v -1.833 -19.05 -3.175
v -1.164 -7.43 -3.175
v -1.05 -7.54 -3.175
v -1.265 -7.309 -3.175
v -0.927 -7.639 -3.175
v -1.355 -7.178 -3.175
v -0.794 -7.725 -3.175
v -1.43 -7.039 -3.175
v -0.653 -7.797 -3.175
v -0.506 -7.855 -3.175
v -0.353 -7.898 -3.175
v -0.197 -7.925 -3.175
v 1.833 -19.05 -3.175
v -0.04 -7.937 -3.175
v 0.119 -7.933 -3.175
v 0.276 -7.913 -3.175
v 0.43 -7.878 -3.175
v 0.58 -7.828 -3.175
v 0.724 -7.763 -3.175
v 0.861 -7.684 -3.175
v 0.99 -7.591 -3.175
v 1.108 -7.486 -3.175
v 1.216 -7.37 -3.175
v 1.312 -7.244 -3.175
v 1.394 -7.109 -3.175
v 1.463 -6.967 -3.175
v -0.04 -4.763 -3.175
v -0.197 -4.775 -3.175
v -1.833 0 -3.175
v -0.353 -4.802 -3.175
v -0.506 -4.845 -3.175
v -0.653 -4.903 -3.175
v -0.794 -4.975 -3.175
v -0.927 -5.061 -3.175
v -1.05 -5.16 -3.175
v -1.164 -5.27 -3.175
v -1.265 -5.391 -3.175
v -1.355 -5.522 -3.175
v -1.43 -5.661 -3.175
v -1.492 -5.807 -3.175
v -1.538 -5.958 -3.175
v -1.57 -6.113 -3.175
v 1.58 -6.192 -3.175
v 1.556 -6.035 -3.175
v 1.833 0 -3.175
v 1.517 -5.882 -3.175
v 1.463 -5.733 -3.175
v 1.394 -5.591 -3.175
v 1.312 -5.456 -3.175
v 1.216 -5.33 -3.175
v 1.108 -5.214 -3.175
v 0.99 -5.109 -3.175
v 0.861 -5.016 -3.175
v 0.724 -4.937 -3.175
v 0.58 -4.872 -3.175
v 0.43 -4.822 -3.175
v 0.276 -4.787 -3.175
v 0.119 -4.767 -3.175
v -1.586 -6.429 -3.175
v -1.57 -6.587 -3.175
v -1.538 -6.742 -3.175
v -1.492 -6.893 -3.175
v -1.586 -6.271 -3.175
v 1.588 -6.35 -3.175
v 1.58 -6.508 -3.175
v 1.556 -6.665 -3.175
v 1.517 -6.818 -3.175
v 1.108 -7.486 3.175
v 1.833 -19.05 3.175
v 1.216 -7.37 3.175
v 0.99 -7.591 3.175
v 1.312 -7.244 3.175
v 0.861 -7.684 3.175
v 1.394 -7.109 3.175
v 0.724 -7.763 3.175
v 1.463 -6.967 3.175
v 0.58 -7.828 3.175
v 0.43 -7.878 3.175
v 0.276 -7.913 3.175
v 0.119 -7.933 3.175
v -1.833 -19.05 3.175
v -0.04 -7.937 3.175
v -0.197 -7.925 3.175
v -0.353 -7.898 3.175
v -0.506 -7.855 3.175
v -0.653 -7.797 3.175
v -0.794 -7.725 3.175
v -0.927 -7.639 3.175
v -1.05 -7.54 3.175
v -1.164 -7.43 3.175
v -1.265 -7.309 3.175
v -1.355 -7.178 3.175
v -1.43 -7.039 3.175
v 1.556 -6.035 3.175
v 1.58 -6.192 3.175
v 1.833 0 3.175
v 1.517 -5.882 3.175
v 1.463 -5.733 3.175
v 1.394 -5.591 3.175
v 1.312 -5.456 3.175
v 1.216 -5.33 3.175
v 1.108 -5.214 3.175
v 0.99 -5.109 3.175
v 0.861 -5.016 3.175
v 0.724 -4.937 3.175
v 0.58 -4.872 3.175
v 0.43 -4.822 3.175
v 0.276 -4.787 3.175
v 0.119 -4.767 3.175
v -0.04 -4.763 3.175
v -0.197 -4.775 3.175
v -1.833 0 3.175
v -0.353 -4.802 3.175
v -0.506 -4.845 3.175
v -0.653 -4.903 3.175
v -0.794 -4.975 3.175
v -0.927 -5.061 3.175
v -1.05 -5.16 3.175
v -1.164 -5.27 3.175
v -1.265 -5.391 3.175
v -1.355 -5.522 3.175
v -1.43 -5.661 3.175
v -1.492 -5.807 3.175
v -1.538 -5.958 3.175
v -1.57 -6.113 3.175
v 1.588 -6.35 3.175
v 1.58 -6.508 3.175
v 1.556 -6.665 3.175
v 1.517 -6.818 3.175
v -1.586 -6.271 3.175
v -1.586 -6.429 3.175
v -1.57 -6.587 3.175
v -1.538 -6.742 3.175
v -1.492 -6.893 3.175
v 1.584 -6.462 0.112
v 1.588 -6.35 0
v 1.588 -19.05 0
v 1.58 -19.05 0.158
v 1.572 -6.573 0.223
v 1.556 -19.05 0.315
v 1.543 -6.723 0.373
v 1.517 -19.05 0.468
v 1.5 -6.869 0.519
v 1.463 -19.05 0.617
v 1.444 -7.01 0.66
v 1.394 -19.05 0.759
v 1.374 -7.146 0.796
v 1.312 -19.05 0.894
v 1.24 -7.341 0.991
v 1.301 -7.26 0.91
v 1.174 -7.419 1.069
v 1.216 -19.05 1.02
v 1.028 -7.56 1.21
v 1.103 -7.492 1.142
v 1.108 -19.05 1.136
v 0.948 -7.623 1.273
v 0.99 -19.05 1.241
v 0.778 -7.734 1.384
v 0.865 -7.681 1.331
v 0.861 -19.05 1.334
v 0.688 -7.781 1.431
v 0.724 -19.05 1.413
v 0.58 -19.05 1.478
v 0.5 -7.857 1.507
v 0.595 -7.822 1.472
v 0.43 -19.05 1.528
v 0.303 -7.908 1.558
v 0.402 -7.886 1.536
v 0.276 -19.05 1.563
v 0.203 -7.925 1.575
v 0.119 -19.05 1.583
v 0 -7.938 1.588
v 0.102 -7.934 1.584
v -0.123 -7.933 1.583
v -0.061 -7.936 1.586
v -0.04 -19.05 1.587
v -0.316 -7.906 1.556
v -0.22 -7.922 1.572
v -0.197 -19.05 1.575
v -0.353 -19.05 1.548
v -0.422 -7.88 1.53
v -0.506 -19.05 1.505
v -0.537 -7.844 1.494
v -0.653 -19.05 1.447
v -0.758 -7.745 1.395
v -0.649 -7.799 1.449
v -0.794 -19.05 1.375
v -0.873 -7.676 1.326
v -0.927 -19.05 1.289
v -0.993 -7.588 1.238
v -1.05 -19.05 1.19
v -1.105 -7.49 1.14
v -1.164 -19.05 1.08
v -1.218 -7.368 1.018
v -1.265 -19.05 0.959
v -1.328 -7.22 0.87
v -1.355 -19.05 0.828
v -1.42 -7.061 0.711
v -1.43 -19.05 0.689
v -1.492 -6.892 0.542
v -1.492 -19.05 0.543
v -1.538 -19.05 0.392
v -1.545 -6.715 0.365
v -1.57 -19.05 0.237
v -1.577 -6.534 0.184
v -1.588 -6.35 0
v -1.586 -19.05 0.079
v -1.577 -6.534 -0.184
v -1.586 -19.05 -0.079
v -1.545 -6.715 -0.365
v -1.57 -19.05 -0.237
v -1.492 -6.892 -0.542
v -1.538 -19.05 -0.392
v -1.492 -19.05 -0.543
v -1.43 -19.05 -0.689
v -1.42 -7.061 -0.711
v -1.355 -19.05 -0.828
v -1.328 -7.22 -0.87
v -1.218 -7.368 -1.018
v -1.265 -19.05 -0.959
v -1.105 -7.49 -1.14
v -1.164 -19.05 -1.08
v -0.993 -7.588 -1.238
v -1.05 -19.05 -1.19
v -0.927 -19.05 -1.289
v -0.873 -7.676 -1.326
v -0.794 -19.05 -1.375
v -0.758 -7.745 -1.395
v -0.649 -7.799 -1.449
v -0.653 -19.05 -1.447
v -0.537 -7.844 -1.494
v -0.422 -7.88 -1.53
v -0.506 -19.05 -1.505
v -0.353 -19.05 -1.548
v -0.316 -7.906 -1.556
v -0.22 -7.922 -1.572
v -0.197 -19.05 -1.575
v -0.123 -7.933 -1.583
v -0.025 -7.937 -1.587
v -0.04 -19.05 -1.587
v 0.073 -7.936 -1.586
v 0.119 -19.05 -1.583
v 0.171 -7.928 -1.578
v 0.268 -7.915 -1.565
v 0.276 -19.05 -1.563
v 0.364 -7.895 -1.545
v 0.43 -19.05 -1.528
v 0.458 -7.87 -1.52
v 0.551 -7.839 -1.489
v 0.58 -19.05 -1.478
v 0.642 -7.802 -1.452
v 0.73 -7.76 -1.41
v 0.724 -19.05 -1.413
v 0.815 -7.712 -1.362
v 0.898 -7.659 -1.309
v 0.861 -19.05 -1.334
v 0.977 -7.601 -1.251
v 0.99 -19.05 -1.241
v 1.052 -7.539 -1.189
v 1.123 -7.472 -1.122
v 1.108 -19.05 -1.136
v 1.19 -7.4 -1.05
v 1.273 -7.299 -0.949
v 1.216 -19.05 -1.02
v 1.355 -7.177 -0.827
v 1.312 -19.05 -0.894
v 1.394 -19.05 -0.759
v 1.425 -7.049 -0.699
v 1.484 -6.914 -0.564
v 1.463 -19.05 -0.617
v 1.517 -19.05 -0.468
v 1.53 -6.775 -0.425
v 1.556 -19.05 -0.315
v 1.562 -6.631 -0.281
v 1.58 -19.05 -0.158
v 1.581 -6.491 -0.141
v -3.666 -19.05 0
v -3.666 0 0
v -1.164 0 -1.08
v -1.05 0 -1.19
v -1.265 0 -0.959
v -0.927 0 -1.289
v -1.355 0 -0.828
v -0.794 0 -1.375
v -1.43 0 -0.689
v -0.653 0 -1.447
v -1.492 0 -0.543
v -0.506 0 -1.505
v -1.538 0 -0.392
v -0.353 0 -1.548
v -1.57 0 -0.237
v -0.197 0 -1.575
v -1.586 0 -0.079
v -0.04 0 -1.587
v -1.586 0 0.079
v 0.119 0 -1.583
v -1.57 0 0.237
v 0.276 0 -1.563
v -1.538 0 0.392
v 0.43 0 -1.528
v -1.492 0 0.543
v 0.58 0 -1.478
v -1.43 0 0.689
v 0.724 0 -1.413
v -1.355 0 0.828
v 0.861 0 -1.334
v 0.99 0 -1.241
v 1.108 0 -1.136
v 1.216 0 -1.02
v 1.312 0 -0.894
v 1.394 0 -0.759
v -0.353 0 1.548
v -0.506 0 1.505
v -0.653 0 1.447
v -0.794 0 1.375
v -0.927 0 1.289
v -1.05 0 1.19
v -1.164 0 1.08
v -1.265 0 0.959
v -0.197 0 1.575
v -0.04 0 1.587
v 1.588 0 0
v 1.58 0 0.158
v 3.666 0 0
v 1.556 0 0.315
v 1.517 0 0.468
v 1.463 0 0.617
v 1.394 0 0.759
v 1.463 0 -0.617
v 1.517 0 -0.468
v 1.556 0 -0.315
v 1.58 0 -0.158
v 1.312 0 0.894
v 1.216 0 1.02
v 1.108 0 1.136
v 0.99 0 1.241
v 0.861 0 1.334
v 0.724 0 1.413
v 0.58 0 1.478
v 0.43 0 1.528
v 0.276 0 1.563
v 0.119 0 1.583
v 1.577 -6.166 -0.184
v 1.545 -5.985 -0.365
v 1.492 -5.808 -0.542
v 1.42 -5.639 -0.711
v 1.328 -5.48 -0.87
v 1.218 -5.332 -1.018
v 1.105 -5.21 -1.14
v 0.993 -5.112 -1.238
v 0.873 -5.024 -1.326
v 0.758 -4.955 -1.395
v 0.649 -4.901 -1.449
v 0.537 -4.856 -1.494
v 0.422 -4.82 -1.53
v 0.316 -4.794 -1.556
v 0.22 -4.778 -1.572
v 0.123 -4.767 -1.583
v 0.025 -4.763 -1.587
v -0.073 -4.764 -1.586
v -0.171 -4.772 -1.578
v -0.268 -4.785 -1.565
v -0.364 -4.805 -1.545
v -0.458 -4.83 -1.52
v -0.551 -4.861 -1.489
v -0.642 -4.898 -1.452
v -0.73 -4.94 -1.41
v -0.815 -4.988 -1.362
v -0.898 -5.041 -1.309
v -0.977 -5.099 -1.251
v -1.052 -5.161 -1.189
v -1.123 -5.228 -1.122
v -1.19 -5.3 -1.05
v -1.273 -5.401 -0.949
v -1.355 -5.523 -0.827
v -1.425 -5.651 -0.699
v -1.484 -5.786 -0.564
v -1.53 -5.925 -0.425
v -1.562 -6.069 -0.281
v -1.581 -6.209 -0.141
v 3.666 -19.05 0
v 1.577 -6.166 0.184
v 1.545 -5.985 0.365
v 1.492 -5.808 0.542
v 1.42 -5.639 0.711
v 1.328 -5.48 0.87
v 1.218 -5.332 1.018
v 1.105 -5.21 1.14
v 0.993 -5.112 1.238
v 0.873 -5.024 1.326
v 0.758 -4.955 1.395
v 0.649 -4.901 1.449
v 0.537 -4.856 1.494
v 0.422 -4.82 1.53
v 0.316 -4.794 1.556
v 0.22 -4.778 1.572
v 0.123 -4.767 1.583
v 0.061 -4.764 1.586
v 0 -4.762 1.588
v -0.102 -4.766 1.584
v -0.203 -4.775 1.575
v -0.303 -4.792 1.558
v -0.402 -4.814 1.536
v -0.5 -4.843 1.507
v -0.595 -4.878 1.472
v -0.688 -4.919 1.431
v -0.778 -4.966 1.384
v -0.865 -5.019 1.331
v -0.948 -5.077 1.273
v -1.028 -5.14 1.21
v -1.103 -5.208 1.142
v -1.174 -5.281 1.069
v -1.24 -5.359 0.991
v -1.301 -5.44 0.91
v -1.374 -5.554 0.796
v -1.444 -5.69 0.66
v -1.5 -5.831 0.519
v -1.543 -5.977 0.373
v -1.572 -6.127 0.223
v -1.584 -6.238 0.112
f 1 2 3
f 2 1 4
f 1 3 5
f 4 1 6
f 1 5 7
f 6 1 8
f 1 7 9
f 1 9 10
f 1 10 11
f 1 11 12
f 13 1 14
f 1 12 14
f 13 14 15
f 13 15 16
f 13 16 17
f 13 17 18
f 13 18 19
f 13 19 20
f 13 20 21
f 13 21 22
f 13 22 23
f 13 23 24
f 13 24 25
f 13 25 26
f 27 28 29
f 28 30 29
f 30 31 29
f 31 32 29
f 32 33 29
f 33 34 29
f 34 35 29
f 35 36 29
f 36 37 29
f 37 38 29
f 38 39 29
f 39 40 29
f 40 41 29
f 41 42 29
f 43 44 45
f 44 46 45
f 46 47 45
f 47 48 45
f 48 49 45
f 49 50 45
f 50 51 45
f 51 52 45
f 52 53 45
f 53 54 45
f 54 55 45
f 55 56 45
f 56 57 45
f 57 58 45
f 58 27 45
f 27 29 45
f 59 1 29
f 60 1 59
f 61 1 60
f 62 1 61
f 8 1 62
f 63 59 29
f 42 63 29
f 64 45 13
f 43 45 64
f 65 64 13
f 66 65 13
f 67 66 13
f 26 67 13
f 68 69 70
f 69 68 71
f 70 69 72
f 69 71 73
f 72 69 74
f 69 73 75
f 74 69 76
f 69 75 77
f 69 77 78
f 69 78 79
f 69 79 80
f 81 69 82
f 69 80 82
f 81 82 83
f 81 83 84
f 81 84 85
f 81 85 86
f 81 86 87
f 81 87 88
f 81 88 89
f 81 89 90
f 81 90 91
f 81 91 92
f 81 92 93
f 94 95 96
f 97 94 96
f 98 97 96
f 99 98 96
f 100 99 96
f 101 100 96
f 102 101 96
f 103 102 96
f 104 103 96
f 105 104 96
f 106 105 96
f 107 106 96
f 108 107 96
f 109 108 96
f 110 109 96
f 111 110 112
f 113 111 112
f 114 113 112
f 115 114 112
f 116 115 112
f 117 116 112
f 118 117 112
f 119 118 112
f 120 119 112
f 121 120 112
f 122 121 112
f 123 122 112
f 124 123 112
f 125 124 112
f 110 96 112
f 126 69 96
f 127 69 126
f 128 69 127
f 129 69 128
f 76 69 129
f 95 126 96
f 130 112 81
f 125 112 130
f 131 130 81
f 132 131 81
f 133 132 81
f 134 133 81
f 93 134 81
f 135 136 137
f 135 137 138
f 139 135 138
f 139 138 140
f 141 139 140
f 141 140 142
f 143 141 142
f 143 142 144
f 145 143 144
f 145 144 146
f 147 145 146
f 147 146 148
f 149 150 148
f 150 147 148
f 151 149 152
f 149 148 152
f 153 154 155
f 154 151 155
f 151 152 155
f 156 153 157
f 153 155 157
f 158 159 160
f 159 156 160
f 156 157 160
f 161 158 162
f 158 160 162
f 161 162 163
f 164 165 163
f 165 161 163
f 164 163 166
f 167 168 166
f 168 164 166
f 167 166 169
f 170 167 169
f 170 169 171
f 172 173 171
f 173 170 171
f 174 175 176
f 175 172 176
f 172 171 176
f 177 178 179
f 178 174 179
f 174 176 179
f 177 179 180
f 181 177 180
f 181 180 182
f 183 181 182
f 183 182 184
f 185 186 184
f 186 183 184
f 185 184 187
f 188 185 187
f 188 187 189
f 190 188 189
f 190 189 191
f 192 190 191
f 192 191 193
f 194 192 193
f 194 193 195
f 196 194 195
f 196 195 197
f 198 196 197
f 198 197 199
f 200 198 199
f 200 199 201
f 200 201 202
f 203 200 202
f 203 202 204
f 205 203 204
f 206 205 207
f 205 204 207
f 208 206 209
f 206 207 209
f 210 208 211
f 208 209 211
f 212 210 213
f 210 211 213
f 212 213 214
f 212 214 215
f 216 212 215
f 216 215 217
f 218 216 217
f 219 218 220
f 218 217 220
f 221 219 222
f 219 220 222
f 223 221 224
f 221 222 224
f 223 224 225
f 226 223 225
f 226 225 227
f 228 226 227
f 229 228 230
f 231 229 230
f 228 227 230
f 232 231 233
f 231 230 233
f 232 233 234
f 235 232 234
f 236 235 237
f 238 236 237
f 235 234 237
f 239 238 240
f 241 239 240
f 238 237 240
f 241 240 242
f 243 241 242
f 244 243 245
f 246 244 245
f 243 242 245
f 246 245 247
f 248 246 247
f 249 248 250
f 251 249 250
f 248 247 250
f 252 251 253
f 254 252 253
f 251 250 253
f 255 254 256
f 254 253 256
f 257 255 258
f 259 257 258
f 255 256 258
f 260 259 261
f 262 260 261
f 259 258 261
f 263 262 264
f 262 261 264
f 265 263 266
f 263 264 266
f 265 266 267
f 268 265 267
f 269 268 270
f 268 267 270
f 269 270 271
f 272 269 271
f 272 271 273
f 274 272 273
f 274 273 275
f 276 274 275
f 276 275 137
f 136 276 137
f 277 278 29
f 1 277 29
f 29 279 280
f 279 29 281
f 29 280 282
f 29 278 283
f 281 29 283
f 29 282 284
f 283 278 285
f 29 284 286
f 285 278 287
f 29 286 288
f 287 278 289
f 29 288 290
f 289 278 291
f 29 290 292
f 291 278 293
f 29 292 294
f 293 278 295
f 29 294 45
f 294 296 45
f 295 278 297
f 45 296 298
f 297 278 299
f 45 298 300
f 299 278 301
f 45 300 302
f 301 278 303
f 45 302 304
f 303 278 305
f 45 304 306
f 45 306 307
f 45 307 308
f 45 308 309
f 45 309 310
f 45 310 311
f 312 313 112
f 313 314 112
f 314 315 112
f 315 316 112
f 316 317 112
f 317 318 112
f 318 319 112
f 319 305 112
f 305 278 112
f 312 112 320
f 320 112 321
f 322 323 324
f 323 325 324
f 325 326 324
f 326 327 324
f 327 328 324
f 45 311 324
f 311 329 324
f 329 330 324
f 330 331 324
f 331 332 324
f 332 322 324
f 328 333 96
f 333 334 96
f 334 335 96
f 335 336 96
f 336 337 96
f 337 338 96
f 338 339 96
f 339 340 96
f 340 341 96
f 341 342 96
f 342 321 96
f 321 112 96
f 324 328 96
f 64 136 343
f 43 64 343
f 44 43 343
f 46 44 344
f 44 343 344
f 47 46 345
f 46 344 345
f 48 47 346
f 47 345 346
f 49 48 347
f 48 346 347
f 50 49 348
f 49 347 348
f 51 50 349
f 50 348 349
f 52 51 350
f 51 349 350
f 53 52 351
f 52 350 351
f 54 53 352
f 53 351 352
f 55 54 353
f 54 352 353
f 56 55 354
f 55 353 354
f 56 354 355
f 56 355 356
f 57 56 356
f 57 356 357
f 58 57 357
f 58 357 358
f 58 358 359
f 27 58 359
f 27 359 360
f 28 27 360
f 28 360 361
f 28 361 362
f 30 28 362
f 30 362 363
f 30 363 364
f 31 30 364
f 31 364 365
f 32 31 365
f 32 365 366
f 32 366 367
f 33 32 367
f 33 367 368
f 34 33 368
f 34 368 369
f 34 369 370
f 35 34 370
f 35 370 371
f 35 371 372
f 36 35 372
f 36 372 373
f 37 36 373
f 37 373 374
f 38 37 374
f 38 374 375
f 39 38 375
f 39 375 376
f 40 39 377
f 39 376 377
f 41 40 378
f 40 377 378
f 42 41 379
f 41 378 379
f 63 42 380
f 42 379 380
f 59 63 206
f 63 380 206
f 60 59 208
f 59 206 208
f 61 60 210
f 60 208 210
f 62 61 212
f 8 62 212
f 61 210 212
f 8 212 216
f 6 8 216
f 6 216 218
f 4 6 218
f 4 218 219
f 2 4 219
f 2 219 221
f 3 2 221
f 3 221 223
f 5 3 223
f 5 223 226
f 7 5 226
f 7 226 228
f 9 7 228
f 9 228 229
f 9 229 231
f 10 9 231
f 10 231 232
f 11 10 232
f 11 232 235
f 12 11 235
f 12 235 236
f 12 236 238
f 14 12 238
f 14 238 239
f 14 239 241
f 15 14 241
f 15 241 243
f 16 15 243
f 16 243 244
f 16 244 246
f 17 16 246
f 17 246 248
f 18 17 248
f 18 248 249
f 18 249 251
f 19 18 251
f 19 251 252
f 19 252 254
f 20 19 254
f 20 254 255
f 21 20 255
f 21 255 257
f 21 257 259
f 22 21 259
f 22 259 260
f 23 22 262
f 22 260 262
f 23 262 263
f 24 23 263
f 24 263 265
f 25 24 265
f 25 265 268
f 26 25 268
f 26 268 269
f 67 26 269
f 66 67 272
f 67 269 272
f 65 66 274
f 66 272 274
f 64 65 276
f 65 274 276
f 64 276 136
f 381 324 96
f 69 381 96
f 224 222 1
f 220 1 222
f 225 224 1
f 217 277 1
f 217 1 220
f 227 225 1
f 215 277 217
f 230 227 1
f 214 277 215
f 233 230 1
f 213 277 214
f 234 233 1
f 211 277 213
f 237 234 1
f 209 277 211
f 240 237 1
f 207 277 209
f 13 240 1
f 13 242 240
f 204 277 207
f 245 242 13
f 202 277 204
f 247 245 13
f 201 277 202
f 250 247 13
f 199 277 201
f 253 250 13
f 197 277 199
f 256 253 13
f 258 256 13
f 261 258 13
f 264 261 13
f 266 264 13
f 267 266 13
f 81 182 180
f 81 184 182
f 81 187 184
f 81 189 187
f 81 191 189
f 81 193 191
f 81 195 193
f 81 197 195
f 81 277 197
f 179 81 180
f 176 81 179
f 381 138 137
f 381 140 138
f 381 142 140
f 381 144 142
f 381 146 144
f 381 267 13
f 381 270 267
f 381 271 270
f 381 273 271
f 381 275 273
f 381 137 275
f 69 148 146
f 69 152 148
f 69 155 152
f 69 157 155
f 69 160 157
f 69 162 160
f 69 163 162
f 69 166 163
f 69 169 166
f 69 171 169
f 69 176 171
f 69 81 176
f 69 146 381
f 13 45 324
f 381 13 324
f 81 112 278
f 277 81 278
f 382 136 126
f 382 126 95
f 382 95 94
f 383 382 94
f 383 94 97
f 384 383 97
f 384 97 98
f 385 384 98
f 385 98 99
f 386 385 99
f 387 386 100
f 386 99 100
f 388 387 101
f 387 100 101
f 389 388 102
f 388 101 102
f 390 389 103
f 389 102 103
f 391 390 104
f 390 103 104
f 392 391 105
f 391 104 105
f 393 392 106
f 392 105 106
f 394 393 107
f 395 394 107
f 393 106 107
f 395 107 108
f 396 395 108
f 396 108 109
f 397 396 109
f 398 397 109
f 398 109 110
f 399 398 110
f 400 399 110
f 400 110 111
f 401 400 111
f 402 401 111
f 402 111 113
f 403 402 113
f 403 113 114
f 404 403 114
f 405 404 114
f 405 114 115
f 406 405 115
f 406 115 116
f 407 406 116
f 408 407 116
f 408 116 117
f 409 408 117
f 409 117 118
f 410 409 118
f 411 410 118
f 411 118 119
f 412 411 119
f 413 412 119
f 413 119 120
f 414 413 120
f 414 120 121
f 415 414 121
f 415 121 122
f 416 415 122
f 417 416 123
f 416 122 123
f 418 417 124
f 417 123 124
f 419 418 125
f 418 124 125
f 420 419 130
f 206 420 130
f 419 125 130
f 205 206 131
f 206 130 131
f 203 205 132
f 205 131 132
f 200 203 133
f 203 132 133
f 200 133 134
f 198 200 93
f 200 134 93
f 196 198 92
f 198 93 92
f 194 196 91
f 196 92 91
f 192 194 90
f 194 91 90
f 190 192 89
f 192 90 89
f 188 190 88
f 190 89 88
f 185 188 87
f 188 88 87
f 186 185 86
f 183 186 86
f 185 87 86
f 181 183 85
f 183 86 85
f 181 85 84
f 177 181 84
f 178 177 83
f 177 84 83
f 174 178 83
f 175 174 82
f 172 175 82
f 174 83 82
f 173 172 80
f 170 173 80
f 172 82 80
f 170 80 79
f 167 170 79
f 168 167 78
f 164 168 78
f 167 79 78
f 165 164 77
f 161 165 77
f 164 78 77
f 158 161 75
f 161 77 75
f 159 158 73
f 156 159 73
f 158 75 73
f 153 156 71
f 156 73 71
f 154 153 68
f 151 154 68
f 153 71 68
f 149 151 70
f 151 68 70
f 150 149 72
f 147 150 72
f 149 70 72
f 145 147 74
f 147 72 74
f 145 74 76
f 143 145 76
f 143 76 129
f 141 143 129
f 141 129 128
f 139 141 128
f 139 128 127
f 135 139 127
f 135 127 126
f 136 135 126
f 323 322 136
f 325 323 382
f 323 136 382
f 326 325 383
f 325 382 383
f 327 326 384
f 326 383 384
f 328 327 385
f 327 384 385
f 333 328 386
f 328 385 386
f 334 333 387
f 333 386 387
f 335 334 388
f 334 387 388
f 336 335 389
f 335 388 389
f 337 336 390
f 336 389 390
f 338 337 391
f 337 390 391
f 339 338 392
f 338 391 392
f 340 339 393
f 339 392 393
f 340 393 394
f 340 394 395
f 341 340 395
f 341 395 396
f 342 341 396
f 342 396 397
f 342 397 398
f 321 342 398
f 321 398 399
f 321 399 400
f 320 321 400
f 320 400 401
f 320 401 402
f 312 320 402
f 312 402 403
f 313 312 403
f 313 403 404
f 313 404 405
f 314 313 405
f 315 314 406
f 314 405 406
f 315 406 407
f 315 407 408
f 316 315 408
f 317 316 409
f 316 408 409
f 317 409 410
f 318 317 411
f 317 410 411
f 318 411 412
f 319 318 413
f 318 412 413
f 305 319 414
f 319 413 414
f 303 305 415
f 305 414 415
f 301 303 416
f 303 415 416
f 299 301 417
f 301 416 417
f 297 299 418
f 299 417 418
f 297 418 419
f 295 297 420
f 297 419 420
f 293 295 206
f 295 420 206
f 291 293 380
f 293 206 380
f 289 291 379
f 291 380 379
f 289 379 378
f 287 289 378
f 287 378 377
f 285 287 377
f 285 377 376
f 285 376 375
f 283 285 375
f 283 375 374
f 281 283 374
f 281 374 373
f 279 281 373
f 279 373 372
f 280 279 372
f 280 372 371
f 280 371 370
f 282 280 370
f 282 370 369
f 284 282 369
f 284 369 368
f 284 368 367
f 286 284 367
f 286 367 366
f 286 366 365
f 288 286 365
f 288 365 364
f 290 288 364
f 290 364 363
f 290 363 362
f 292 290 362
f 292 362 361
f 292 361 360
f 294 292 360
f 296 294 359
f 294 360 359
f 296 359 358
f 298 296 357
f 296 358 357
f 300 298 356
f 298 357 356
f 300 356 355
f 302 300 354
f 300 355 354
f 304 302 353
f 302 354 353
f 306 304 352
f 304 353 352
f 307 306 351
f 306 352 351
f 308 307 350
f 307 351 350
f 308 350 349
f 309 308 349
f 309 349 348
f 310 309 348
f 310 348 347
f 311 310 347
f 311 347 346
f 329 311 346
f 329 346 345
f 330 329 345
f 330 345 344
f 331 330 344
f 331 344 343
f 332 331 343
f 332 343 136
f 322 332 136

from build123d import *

# Parameters (mm, degrees)
F1_DEPTH = 19.05
F2_R     = 1.5875
F3_DEPTH = 6.351
F4_R     = 1.5875
F5_DEPTH = 19.051


with BuildPart() as f1:
    # F0 (on Front) → F1 (new body)
    with BuildSketch(Plane.XZ):
        Polygon((1.833087, 3.175), (-1.833087, 3.175), (-3.666174, 0), (-1.833087, -3.175), (1.833087, -3.175), (3.666174, 0), align=None)
    extrude(amount=F1_DEPTH)

    # F2 (on face) → F3 (cut, through all)
    with BuildSketch(Plane.XY.offset(3.175)):
        with Locations((0, -6.35)):
            Circle(F2_R)
    extrude(amount=-F3_DEPTH, mode=Mode.SUBTRACT)

    # F4 (on face) → F5 (cut, through all)
    with BuildSketch(Plane.XZ.offset(19.05)):
        Circle(F4_R)
    extrude(amount=-F5_DEPTH, mode=Mode.SUBTRACT)


solid = f1.part
